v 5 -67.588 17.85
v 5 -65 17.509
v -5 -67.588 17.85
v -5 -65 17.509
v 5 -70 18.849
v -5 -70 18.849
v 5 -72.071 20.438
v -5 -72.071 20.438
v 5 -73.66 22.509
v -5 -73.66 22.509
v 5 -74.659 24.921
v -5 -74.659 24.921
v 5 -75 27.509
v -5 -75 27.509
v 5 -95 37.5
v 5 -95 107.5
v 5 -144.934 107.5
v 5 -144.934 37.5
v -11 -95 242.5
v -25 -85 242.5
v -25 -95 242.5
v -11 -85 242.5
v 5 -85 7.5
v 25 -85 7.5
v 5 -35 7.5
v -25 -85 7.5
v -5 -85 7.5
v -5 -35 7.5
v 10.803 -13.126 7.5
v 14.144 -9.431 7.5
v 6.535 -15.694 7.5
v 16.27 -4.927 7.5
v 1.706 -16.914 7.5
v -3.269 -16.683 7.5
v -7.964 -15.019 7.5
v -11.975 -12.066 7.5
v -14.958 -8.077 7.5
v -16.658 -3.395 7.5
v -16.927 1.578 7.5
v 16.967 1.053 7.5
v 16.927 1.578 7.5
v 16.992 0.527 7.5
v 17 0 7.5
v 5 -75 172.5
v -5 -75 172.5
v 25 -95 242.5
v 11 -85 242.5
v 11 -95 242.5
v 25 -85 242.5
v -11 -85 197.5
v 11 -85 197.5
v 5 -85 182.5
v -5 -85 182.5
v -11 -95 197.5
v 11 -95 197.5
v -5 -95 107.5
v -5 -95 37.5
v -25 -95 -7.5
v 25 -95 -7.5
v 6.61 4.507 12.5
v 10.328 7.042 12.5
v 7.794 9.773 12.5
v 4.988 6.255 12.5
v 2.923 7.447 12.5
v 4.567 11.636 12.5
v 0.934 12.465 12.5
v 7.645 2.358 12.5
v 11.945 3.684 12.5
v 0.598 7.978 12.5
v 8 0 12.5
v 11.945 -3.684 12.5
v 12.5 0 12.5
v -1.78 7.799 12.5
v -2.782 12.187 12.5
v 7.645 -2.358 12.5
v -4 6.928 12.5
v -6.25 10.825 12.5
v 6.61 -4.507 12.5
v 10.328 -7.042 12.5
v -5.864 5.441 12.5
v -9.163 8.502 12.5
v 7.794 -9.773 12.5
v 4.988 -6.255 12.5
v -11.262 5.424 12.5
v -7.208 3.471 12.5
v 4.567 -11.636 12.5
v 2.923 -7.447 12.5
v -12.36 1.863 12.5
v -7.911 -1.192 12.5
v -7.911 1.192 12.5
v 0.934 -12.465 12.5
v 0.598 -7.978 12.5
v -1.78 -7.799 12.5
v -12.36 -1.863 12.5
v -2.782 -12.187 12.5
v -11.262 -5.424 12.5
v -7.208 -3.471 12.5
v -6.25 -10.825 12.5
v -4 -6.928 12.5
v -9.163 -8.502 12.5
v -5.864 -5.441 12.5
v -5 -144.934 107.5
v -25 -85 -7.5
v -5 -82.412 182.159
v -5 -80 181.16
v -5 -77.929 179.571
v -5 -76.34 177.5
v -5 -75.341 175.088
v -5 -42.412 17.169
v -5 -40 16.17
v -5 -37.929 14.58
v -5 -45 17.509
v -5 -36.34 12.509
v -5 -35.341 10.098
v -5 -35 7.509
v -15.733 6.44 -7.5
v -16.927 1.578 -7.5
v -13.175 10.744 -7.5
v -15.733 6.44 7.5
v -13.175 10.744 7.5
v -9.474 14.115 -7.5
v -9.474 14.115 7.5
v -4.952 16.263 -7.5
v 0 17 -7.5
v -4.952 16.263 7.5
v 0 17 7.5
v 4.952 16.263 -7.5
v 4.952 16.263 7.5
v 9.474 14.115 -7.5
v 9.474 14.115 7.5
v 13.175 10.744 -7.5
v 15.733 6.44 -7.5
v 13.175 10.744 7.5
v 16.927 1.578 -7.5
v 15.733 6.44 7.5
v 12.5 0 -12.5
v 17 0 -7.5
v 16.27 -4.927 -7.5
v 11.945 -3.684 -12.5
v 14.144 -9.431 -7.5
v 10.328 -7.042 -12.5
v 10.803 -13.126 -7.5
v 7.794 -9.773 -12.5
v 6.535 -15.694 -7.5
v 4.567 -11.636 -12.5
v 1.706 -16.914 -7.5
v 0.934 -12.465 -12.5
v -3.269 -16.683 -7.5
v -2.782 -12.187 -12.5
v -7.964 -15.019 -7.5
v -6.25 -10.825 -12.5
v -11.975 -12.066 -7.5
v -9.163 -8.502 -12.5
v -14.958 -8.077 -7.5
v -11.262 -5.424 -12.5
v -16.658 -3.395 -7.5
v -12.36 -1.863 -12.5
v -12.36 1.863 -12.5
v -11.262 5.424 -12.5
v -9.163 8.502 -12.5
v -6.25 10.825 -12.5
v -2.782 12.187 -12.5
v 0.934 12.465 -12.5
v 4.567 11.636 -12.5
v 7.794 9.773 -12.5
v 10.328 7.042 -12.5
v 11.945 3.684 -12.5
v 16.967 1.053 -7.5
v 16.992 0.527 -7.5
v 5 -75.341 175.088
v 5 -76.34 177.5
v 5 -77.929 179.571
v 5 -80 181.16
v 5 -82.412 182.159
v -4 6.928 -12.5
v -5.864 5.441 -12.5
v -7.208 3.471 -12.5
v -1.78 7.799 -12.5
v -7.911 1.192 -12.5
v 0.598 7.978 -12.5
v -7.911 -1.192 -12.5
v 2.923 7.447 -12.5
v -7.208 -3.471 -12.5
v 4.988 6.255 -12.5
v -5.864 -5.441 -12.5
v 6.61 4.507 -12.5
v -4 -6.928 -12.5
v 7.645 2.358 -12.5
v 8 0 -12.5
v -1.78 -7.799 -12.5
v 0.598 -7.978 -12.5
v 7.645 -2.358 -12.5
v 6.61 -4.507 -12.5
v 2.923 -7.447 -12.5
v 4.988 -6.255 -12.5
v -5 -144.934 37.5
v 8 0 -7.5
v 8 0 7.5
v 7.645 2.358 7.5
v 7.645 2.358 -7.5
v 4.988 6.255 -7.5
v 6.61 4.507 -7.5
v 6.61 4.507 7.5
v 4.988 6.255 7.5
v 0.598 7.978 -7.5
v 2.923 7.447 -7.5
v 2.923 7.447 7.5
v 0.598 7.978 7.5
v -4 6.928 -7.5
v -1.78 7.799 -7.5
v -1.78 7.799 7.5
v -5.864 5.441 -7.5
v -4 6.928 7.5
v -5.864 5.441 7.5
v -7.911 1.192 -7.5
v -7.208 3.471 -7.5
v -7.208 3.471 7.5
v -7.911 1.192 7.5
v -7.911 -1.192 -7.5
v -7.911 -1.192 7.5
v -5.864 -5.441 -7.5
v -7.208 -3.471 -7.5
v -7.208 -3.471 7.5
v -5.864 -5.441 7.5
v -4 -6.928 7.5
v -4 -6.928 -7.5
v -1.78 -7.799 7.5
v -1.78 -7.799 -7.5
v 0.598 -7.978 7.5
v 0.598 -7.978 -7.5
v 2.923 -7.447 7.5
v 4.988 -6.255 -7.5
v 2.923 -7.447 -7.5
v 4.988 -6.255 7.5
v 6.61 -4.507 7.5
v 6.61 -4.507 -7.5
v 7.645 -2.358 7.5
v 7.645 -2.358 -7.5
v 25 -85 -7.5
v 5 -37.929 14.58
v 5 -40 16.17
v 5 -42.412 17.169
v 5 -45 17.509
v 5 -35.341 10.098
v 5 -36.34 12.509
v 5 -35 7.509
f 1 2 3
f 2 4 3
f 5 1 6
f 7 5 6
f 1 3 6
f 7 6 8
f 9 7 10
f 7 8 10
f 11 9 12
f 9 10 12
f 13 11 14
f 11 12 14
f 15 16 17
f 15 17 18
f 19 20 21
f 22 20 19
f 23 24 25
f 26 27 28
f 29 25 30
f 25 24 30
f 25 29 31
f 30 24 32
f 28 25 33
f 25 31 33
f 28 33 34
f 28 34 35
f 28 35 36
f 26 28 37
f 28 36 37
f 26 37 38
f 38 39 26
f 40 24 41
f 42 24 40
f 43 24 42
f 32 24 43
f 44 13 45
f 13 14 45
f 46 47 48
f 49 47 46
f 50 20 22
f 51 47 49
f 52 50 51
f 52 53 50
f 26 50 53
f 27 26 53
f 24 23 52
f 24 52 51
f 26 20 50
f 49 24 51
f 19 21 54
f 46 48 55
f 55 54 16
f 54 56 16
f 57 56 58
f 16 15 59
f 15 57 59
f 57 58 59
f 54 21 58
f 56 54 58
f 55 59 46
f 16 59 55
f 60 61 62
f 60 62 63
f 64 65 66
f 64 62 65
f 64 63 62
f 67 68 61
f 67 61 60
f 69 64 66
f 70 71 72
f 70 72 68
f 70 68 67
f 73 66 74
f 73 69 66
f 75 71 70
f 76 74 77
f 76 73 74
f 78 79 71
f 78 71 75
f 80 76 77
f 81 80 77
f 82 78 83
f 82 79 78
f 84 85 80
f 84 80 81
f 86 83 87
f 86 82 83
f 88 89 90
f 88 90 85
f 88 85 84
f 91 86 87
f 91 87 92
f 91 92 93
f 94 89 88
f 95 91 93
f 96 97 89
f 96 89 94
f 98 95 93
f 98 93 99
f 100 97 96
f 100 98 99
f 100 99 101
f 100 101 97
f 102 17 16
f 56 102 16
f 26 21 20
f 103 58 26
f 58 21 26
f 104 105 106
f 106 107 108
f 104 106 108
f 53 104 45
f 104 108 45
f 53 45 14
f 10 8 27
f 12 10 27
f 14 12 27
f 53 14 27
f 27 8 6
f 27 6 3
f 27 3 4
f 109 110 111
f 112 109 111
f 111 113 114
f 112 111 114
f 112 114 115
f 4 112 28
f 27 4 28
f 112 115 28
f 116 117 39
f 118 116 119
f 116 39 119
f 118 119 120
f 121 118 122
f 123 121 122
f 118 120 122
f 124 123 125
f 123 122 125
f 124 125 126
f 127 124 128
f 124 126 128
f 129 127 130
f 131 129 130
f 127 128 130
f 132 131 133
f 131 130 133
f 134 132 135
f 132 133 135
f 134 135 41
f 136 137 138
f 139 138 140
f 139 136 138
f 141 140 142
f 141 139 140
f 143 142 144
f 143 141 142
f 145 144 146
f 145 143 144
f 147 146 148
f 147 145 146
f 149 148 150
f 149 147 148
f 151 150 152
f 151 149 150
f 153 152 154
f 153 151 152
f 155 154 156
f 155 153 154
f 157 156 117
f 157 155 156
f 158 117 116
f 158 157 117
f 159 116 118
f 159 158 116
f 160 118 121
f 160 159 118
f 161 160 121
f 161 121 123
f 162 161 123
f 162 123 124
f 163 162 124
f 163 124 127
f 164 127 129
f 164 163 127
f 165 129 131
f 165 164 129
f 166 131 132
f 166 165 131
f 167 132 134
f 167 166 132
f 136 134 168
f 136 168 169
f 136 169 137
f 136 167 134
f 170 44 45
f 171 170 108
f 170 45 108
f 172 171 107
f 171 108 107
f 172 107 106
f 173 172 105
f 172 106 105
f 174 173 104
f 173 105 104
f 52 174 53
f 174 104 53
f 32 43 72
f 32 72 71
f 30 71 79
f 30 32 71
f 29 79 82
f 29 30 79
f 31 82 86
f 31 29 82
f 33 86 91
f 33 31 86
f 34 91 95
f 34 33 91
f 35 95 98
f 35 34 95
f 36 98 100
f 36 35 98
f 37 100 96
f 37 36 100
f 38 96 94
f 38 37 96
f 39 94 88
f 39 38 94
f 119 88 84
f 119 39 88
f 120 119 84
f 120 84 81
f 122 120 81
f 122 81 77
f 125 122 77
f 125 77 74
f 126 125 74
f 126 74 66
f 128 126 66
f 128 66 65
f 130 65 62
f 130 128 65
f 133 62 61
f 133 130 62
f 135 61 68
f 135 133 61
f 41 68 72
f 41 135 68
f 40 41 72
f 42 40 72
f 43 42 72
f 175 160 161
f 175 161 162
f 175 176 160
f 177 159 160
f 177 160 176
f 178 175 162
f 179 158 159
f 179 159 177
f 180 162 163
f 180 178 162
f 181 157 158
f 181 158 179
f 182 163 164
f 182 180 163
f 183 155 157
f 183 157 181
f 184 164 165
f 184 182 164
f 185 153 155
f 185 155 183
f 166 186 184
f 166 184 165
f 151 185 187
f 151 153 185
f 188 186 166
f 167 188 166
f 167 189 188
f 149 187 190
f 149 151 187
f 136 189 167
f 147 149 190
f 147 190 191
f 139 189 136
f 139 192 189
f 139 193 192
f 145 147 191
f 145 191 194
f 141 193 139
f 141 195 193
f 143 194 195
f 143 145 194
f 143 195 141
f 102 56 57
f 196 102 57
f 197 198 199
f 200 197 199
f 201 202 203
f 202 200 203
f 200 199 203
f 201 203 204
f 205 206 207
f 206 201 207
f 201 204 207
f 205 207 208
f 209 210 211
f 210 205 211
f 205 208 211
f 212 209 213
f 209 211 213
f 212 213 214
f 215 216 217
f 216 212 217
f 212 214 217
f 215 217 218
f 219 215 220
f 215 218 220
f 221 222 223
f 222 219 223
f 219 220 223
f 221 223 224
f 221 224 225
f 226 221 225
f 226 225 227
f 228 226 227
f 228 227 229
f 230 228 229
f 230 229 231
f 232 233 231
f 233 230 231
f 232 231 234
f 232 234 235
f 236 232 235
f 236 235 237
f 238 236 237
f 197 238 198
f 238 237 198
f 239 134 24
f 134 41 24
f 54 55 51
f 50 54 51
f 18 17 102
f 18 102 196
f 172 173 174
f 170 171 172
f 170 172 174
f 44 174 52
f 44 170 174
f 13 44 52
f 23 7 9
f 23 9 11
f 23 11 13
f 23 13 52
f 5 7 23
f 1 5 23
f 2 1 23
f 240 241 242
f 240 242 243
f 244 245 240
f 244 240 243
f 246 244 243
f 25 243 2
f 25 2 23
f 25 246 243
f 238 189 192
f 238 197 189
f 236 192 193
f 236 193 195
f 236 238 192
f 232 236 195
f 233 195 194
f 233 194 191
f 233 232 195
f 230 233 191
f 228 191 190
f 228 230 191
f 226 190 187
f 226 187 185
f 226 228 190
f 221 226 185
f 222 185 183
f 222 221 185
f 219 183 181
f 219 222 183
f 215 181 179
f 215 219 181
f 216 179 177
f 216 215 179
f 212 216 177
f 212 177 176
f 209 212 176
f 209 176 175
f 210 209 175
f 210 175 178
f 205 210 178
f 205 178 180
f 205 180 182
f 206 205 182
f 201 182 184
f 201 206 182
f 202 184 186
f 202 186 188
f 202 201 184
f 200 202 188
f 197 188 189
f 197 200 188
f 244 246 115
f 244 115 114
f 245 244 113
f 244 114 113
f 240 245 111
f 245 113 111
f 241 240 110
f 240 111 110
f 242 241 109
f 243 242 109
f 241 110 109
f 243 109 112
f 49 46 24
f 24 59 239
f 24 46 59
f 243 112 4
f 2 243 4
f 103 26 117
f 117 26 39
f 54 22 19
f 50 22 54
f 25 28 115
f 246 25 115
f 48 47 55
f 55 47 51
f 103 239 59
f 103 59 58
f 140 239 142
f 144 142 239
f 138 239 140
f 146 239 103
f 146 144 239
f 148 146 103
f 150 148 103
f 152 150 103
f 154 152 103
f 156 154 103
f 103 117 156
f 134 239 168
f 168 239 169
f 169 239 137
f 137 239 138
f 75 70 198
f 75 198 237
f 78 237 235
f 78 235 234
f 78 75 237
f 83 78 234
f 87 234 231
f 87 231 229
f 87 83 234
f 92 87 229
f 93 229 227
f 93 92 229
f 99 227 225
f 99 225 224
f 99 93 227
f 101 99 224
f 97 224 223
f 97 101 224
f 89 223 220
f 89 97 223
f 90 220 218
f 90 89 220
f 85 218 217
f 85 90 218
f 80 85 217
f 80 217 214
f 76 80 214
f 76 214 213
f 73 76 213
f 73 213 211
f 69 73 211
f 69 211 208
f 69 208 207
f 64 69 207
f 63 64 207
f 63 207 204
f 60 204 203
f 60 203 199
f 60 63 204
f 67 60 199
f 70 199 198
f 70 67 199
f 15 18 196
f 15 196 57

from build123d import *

# Parameters (mm, degrees)
BOSS_EXTRUDE1_DEPTH = 7.5
SKETCH2_W           = 50
SKETCH2_H           = 10
BOSS_EXTRUDE2_DEPTH = 235
SKETCH4_W           = 70
SKETCH4_H           = 49.933850778
BOSS_EXTRUDE3_DEPTH = 5
SKETCH5_R           = 8
CUT_EXTRUDE1_DEPTH  = 21
SKETCH6_W           = 67.307350871
SKETCH6_H           = 68.73953257
CUT_EXTRUDE2_DEPTH  = 11


with BuildPart() as part:
    # Sketch1 → Boss-Extrude1 (new body, symmetric)
    with BuildSketch(Plane.XY):
        with BuildLine():
            Line((-25, -85), (-16.926566325, 1.57840186))
            ThreePointArc((-16.926566325, 1.57840186), (0, 17), (16.926566325, 1.57840186))
            Line((16.926566325, 1.57840186), (25, -85))
            Line((25, -85), (25, -95))
            Line((25, -95), (-25, -95))
            Line((-25, -95), (-25, -85))
        make_face()
    extrude(amount=BOSS_EXTRUDE1_DEPTH, both=True)

    # Sketch2 → Boss-Extrude2 (add)
    with BuildSketch(Plane.XY.offset(7.5)):
        with Locations((0, -90)):
            Rectangle(SKETCH2_W, SKETCH2_H)
    extrude(amount=BOSS_EXTRUDE2_DEPTH)

    # Sketch3 → Revolve1 (revolve)
    with BuildSketch(Plane(origin=(0, 0, 0), x_dir=(0, 0, -1), z_dir=(1, 0, 0)), mode=Mode.PRIVATE) as revolve1_sk:
        Polygon((-12.5, 8), (-12.5, 12.5), (-7.5, 17), (-7.5, 8), align=None)
        Polygon((12.5, 8), (7.5, 8), (7.5, 17), (12.5, 12.5), align=None)
    revolve(revolve1_sk.sketch.rotate(Axis((0, 0, 1025), (0, 0, -1)), 90), axis=Axis((0, 0, 1025), (0, 0, -1)))  # turned: the seam where the file's is

    # Sketch4 → Boss-Extrude3 (add, symmetric)
    with BuildSketch(Plane(origin=(0, 0, 0), x_dir=(0, 0, -1), z_dir=(1, 0, 0))):
        with BuildLine():
            Line((-17.509416808, -45), (-17.509416808, -65))
            ThreePointArc((-17.509416808, -65), (-20.438348996, -72.071067812), (-27.509416808, -75))
            Line((-27.509416808, -75), (-172.5, -75))
            ThreePointArc((-172.5, -75), (-179.571067812, -77.928932188), (-182.5, -85))
            Line((-182.5, -85), (-7.5, -85))
            Line((-7.5, -85), (-7.5, -35))
            Line((-7.5, -35), (-7.509416808, -35))
            ThreePointArc((-7.509416808, -35), (-14.58048462, -37.928932188), (-17.509416808, -45))
        make_face()
        with Locations((-72.5, -119.966925389)):
            Rectangle(SKETCH4_W, SKETCH4_H)
    extrude(amount=BOSS_EXTRUDE3_DEPTH, both=True)

    # Sketch5 → Cut-Extrude1 (cut, through all)
    with BuildSketch(Plane.XY.offset(7.5)):
        Circle(SKETCH5_R)
    extrude(amount=-CUT_EXTRUDE1_DEPTH, mode=Mode.SUBTRACT)

    # Sketch6 → Cut-Extrude2 (cut, symmetric)
    with BuildSketch(Plane(origin=(0, 0, 0), x_dir=(0, 0, -1), z_dir=(1, 0, 0))):
        with Locations((-231.153675436, -92.172536307)):
            Rectangle(SKETCH6_W, SKETCH6_H)
    extrude(amount=CUT_EXTRUDE2_DEPTH, both=True, mode=Mode.SUBTRACT)


solid = part.part
